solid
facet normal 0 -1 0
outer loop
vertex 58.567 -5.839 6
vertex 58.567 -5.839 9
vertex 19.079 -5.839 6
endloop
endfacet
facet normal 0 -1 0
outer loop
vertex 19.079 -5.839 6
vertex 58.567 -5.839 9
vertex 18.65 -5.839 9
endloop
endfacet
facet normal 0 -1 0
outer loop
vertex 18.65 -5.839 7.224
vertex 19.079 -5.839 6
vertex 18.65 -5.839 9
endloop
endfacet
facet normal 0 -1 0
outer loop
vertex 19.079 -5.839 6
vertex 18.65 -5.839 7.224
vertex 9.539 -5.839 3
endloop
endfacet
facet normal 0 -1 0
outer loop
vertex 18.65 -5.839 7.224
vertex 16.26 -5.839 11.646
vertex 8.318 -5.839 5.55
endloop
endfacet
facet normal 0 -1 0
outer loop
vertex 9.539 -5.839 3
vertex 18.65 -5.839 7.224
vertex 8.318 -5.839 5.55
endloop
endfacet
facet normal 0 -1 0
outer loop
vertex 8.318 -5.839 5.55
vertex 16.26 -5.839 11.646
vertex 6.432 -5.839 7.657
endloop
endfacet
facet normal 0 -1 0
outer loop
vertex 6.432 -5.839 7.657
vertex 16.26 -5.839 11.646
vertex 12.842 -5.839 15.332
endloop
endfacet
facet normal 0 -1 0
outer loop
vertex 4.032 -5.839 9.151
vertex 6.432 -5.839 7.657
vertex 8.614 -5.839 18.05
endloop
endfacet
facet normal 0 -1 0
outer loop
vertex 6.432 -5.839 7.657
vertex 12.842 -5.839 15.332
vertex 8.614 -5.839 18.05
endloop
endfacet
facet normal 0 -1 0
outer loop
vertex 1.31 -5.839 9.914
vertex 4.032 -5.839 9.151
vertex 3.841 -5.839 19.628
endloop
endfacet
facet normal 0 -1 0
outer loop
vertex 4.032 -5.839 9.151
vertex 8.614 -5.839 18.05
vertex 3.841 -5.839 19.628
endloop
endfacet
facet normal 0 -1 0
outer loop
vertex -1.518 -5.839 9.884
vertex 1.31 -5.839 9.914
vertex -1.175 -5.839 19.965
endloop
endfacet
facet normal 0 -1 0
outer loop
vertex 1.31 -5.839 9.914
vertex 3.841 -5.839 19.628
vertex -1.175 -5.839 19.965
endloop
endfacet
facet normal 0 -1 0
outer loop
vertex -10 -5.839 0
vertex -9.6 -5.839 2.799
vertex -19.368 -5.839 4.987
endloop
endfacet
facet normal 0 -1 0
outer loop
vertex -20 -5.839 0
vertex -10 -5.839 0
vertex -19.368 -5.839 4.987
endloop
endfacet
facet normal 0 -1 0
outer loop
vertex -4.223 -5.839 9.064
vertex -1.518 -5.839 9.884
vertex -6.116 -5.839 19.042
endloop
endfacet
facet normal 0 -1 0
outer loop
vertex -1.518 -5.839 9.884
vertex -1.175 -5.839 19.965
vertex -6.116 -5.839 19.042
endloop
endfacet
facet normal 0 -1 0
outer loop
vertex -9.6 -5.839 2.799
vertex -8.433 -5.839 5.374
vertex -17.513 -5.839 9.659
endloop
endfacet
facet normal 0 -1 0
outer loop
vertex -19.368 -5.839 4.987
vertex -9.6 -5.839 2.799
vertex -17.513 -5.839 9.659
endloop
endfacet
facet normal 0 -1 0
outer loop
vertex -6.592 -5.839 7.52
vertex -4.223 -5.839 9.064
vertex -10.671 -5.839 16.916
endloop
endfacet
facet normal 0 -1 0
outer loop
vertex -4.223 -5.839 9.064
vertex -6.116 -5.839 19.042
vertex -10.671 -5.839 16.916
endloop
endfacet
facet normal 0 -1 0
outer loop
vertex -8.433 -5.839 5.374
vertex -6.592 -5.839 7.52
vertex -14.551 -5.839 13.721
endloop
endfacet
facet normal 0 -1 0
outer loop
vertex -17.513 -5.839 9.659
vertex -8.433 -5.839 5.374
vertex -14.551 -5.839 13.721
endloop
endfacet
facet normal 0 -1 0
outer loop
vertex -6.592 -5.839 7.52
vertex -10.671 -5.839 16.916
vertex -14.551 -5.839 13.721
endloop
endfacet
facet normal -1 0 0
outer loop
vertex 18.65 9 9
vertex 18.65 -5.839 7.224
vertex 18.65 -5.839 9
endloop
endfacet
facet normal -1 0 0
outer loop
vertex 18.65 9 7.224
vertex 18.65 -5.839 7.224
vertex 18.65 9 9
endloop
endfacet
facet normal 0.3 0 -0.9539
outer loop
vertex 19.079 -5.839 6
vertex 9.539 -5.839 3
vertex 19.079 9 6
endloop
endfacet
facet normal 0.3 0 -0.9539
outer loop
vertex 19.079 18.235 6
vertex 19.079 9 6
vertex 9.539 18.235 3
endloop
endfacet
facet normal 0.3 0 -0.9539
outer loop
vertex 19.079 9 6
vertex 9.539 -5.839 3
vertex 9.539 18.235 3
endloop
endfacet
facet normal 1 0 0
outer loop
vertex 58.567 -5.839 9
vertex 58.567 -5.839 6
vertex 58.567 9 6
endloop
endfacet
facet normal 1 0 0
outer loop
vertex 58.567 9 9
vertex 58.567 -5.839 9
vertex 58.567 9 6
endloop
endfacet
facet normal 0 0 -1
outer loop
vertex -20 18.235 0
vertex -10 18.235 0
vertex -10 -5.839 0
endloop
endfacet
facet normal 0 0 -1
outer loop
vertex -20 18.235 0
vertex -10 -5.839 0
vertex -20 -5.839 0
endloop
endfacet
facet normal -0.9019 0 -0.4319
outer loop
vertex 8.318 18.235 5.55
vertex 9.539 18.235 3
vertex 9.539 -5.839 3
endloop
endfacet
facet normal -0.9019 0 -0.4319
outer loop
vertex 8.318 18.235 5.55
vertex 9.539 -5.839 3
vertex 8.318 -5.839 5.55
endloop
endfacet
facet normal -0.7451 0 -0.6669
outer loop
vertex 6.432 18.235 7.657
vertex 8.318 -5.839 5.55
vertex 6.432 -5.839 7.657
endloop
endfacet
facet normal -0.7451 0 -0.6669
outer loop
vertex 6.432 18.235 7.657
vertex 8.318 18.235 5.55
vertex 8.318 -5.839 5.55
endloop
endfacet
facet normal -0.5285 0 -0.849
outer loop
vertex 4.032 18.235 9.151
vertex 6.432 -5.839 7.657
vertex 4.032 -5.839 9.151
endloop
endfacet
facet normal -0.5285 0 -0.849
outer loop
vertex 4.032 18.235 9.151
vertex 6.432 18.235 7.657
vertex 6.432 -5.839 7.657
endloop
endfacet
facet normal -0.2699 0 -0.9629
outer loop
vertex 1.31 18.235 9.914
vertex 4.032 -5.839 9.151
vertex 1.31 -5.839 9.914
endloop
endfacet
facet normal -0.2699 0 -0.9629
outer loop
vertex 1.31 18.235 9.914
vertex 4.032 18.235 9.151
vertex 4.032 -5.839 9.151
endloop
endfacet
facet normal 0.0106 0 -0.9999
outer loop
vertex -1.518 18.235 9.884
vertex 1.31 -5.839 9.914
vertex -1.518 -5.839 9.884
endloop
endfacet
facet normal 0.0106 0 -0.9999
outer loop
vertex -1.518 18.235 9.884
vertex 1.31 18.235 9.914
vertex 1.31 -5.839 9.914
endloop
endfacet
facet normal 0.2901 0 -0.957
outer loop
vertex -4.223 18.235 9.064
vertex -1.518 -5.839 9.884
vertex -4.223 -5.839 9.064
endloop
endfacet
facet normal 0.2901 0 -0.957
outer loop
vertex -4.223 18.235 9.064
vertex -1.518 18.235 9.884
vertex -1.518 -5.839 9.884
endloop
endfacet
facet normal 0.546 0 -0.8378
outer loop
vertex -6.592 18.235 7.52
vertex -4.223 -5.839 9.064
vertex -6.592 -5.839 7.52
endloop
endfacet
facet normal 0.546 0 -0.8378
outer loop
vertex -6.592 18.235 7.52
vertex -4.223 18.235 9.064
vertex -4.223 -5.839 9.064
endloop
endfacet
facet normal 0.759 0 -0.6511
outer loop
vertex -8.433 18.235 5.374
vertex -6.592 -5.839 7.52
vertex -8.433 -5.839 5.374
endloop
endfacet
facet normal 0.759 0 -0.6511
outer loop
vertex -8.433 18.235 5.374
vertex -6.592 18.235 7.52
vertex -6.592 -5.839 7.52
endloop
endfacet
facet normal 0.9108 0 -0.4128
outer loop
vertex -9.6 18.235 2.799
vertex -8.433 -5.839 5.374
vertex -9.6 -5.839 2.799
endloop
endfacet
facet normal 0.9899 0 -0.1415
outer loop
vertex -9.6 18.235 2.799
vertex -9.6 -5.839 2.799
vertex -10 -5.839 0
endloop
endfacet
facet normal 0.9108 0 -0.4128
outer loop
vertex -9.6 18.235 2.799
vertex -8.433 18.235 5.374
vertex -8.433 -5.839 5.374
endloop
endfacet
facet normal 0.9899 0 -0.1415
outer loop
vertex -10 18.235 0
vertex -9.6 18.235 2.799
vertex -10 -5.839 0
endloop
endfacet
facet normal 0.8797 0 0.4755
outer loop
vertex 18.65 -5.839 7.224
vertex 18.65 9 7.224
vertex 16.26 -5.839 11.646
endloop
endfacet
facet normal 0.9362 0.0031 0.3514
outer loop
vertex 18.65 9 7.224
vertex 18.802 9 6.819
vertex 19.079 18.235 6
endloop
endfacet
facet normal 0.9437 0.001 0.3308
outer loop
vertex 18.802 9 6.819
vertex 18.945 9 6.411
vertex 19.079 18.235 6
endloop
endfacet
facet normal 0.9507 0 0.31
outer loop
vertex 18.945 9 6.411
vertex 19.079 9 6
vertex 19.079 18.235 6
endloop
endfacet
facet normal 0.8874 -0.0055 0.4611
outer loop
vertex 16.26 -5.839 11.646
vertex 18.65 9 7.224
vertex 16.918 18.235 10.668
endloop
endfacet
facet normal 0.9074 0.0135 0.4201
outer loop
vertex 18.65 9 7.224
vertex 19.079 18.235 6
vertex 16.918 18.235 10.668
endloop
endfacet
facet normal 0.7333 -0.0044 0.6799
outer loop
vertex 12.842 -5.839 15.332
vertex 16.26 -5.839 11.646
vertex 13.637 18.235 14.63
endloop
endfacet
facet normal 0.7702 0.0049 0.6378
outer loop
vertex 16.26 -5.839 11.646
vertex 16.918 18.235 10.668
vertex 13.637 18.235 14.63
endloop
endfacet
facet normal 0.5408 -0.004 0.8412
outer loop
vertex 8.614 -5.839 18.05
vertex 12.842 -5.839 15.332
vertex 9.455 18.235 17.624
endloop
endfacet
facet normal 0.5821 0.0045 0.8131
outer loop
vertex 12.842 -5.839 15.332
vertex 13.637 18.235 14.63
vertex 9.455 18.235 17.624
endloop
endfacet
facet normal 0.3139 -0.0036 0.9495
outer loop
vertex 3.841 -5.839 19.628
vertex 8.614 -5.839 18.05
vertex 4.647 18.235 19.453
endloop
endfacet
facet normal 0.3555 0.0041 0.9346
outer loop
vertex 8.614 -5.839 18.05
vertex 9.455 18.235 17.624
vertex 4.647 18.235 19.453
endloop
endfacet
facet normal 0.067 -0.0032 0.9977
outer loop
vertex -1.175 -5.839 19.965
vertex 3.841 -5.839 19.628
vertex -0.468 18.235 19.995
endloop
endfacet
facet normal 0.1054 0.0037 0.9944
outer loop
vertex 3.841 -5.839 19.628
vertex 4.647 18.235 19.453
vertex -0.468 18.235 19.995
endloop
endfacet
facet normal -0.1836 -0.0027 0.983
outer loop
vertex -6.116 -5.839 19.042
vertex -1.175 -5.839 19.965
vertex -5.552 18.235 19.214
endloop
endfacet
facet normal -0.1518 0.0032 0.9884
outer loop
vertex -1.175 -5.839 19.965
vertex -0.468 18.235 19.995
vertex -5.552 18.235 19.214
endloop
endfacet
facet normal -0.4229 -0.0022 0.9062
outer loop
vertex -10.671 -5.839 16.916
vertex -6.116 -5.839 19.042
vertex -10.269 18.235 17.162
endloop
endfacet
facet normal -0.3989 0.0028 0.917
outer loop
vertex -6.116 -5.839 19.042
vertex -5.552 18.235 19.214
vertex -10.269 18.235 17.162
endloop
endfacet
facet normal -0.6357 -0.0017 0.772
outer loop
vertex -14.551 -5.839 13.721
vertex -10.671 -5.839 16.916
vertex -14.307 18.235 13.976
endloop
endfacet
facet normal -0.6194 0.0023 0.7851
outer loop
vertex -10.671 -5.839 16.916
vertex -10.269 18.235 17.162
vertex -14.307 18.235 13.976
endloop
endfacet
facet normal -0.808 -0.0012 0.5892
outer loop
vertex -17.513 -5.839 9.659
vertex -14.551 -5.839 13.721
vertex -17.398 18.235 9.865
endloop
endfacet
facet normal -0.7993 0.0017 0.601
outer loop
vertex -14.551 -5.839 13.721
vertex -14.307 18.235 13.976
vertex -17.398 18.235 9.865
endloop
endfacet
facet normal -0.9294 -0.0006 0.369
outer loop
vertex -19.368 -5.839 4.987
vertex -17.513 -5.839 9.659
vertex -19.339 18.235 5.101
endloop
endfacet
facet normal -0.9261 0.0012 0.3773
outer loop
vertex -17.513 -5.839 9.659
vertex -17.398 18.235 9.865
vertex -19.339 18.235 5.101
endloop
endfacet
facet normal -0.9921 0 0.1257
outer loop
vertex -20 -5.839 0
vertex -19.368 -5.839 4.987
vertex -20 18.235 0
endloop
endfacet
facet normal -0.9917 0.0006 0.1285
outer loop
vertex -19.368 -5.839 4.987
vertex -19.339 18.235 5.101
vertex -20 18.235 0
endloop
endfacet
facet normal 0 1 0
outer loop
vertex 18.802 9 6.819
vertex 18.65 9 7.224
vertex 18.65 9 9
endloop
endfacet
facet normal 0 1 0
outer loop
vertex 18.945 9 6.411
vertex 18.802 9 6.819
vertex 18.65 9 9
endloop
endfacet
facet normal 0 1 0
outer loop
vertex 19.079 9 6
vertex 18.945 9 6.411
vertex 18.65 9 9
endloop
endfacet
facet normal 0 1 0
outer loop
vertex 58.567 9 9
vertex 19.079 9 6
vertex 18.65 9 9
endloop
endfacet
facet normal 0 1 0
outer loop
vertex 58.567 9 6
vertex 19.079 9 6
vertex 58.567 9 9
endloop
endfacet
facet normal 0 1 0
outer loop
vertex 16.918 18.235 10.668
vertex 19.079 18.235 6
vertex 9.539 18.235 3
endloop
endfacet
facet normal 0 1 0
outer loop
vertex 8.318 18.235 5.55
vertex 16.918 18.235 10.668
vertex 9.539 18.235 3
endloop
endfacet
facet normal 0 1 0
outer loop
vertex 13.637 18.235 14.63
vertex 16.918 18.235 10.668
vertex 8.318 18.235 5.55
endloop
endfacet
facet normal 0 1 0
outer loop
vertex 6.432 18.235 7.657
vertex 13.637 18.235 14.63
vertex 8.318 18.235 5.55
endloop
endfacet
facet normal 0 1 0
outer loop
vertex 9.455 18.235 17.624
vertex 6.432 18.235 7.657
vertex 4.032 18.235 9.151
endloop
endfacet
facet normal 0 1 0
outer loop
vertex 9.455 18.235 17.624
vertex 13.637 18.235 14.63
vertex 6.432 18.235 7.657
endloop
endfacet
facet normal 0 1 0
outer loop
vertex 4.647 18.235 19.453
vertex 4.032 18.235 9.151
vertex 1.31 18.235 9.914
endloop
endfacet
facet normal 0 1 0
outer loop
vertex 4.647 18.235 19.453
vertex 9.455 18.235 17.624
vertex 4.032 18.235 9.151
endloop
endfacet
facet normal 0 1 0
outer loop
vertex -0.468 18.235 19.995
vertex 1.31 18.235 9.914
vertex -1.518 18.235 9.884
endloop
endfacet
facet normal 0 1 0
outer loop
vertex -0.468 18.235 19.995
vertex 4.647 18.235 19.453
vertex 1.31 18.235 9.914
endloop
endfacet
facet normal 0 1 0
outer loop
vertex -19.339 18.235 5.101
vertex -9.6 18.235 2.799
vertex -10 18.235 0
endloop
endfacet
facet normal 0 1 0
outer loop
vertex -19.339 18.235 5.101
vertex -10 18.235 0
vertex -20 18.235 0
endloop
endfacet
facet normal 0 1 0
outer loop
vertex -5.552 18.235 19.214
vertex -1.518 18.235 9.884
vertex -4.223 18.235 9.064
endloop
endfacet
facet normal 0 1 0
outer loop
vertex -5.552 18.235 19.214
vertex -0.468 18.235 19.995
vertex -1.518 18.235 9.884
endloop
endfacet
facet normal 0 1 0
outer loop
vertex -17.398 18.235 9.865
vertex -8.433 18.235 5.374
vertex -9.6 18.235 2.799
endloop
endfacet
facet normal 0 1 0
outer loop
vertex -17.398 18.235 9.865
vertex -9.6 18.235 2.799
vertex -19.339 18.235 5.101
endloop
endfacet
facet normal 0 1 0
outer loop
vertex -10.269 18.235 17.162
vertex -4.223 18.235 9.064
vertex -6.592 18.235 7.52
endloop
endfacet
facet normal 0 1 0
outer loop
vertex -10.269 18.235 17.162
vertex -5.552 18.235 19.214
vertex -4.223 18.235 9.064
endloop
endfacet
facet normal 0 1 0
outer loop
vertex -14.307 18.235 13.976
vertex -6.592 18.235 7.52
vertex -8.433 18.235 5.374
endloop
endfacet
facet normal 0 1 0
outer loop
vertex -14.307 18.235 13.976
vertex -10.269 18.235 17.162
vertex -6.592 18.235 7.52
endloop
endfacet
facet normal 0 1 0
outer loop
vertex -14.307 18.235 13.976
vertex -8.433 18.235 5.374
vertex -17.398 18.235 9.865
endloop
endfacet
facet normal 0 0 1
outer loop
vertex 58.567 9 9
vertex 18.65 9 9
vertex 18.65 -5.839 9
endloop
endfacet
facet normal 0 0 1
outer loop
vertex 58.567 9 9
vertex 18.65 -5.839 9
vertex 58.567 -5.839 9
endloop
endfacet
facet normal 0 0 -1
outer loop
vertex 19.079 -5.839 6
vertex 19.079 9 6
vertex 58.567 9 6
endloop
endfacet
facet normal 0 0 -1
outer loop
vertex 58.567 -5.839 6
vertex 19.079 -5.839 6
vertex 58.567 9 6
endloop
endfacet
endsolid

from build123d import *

# Parameters (mm, degrees)
SKETCH1_W              = 10
SKETCH1_H              = 24.07430416
REVOLVE2_ANGLE         = 180
BOSS_EXTRUDE1_START    = 6
SKETCH1_7_W            = 39.916856905
SKETCH1_7_H            = 14.839467349
BOSS_EXTRUDE1_DEPTH    = 3
CUT_REVOLVE2_START     = -19.078784028
CUT_REVOLVE2_OUTLINE_W = 24.07430416
CUT_REVOLVE2_OUTLINE_H = 7
CUT_REVOLVE2_DEPTH     = 39.078784028


with BuildPart() as part:
    # Sketch1 → Revolve2 (revolve)
    with BuildSketch(Plane.XY):
        with Locations((15, 6.197684731)):
            Rectangle(SKETCH1_W, SKETCH1_H)
    revolve(axis=Axis((0, -3.039467349, 0), (0, -1, 0)), revolution_arc=REVOLVE2_ANGLE)

    # Sketch1<7> → Boss-Extrude1 (add)
    with BuildSketch(Plane.XY.offset(BOSS_EXTRUDE1_START)):
        with Locations((38.608341788, 1.580266325)):
            Rectangle(SKETCH1_7_W, SKETCH1_7_H)
    extrude(amount=BOSS_EXTRUDE1_DEPTH)

    # Cut-Revolve2: read off the stored shape, not the designer's step
    # Cut-Revolve2 outline → Cut-Revolve2 (cut)
    with BuildSketch(Plane(origin=(0, 0, 0), x_dir=(0, 1, 0), z_dir=(0.9539392014169458, 0, 0.29999999999999993)).offset(CUT_REVOLVE2_START)):
        with Locations((6.197684731, -3.5)):
            Rectangle(CUT_REVOLVE2_OUTLINE_W, CUT_REVOLVE2_OUTLINE_H)
    extrude(amount=CUT_REVOLVE2_DEPTH, mode=Mode.SUBTRACT)


solid = part.part
